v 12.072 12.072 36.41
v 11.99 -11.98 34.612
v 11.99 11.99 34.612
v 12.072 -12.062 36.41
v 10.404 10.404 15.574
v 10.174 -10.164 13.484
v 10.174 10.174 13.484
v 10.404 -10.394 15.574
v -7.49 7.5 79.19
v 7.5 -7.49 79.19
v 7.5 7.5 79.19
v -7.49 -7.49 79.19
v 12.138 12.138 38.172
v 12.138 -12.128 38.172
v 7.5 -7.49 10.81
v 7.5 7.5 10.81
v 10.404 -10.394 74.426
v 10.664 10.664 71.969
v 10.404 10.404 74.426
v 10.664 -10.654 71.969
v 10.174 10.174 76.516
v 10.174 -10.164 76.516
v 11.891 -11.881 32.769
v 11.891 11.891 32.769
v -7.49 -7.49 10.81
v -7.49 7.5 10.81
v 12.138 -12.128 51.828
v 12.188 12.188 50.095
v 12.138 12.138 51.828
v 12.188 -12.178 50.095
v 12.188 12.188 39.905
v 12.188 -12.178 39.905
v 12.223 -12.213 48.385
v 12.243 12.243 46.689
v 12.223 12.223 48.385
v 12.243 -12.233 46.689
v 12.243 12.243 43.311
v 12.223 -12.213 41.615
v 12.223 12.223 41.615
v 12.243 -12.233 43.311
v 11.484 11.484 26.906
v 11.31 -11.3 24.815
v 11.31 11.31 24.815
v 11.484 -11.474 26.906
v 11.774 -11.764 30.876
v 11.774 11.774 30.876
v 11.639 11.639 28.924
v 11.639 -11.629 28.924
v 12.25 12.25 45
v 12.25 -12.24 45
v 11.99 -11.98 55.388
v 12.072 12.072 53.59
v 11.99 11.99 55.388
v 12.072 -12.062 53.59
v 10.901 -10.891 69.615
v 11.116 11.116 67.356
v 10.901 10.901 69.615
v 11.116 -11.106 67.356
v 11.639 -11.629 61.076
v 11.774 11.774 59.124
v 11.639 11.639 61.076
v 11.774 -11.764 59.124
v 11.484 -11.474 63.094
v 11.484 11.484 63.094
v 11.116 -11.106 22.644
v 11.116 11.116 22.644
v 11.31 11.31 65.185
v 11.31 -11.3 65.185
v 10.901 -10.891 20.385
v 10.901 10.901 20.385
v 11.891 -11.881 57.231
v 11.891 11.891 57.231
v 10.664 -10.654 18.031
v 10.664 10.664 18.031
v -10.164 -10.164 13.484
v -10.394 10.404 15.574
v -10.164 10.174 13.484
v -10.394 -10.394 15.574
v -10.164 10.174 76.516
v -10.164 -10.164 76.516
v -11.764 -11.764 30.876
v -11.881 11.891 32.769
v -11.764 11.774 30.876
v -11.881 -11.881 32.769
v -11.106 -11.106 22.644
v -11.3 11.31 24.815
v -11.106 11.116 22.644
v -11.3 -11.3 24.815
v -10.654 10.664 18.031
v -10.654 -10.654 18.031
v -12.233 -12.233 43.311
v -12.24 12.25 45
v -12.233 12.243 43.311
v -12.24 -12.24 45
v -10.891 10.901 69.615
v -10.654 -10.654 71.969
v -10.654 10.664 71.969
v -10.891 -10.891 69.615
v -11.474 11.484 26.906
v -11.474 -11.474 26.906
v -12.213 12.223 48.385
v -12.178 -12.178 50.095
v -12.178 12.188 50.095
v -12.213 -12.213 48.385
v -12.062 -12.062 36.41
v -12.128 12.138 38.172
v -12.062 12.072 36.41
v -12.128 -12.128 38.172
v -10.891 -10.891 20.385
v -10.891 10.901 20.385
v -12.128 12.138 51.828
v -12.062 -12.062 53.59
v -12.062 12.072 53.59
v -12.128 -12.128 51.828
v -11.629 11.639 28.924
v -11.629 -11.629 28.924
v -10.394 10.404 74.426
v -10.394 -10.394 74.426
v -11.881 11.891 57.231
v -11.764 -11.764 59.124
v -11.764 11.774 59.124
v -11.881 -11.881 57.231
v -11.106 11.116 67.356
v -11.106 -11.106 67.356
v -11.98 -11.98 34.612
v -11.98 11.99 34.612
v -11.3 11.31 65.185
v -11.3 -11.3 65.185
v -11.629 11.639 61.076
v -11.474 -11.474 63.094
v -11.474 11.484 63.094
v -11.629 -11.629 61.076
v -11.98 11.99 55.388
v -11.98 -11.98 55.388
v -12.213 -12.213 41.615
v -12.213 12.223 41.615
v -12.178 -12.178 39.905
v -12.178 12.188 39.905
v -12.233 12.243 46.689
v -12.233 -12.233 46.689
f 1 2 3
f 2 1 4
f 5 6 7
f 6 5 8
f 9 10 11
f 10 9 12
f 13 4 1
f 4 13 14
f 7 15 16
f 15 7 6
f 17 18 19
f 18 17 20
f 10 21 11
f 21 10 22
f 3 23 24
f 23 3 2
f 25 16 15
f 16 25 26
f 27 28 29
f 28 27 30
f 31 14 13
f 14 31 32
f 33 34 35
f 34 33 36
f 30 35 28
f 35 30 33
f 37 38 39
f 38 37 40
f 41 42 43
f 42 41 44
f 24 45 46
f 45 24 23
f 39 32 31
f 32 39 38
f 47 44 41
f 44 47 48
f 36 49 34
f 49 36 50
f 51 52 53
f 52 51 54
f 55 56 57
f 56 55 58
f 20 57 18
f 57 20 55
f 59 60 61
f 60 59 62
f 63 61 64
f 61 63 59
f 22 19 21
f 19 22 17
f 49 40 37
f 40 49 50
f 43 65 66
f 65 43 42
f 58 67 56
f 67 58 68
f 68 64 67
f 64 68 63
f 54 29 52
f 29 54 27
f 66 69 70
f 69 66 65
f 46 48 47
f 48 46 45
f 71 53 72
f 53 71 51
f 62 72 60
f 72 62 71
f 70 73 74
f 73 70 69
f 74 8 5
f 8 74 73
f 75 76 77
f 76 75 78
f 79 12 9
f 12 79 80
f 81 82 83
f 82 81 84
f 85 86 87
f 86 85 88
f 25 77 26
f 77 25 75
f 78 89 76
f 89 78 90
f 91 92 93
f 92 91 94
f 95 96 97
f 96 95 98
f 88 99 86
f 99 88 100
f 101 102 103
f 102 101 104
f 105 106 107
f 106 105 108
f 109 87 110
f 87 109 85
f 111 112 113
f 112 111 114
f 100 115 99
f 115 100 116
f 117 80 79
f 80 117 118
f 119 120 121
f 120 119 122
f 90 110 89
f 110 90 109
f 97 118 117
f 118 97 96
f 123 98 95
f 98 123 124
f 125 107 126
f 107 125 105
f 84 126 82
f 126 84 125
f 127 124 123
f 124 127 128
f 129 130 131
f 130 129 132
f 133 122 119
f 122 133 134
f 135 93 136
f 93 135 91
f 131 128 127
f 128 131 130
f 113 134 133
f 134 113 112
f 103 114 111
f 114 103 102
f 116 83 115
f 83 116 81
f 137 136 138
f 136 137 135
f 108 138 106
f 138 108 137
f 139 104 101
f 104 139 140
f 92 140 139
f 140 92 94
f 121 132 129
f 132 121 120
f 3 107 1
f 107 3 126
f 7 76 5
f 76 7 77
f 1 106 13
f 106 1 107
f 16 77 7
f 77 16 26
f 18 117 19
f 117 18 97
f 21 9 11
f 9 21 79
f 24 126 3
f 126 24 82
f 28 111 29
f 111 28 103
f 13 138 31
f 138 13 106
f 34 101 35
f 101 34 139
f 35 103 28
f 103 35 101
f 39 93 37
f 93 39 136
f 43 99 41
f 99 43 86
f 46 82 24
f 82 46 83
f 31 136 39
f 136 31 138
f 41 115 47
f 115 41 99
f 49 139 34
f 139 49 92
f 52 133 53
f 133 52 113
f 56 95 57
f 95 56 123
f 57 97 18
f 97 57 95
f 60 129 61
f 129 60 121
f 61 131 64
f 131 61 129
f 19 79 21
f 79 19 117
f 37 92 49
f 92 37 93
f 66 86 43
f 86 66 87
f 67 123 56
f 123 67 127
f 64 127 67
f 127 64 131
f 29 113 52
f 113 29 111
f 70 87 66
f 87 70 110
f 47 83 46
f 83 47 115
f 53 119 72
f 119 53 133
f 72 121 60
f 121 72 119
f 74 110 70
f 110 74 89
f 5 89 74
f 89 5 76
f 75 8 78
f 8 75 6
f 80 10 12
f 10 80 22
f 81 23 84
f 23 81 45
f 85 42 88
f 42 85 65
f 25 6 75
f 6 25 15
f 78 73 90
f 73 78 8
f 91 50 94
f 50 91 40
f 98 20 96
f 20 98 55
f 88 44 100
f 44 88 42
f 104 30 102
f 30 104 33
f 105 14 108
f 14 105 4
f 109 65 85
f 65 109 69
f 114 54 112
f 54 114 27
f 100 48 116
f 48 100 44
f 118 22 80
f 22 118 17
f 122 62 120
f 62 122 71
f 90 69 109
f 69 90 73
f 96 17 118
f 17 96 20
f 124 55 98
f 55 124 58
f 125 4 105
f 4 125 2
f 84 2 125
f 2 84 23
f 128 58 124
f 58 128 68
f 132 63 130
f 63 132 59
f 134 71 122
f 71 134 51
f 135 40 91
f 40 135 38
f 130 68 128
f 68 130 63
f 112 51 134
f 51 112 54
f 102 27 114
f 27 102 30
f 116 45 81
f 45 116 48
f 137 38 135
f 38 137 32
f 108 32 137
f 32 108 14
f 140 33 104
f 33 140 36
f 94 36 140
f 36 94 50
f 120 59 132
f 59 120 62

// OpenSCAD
// file: bezier.scad
/* 
Copyright (c) 2017 Alexander R. Pruss.

Licensed under any Creative Commons Attribution license you like or under the 
following MIT License.

Permission is hereby granted, free of charge, to any person obtaining a copy
of this software and associated documentation files (the "Software"), to deal
in the Software without restriction, including without limitation the rights
to use, copy, modify, merge, publish, distribute, sublicense, and/or sell
copies of the Software, and to permit persons to whom the Software is
furnished to do so, subject to the following conditions:

The above copyright notice and this permission notice shall be included in all
copies or substantial portions of the Software.

THE SOFTWARE IS PROVIDED "AS IS", WITHOUT WARRANTY OF ANY KIND, EXPRESS OR
IMPLIED, INCLUDING BUT NOT LIMITED TO THE WARRANTIES OF MERCHANTABILITY,
FITNESS FOR A PARTICULAR PURPOSE AND NONINFRINGEMENT. IN NO EVENT SHALL THE
AUTHORS OR COPYRIGHT HOLDERS BE LIABLE FOR ANY CLAIM, DAMAGES OR OTHER
LIABILITY, WHETHER IN AN ACTION OF CONTRACT, TORT OR OTHERWISE, ARISING FROM,
OUT OF OR IN CONNECTION WITH THE SOFTWARE OR THE USE OR OTHER DEALINGS IN THE
SOFTWARE. 

*/


// Public domain Bezier stuff from www.thingiverse.com/thing:8443
function BEZ03(u) = pow((1-u), 3);
function BEZ13(u) = 3*u*(pow((1-u),2));
function BEZ23(u) = 3*(pow(u,2))*(1-u);
function BEZ33(u) = pow(u,3);
function PointAlongBez4(p0, p1, p2, p3, u) = [
	BEZ03(u)*p0[0]+BEZ13(u)*p1[0]+BEZ23(u)*p2[0]+BEZ33(u)*p3[0],
	BEZ03(u)*p0[1]+BEZ13(u)*p1[1]+BEZ23(u)*p2[1]+BEZ33(u)*p3[1]];
// End public domain Bezier stuff

function SMOOTH_REL(x) = ["r",x];
function SMOOTH_ABS(x) = ["a",x];
function SYMMETRIC() = ["r",1];
function OFFSET(v) = ["o",v];
function SHARP() = OFFSET([0,0]);
function POLAR(r,angle) = OFFSET(r*[cos(angle),sin(angle)]);
function POINT_IS_SPECIAL(v) = (v[0]=="r" || v[0]=="a" || v[0]=="o");

function normalize2D(v) = v / sqrt(v[0]*v[0]+v[1]*v[1]);

// this does NOT handle offset type points; to handle those, use DecodeBezierOffsets()
function getControlPoint(cp,node,otherCP) = cp[0]=="r"?(node+cp[1]*(node-otherCP)):( cp[0]=="a"?node+cp[1]*normalize2D(node-otherCP):cp );

function Bezier2(p,index=0,precision=0.05,rightEndPoint=true) = let(nPoints=ceil(1/precision)) [for (i=[0:nPoints-(rightEndPoint?0:1)]) PointAlongBez4(p[index+0],p[index+1],p[index+2],p[index+3],i/nPoints)];
    
function flatten(listOfLists) = [ for(list = listOfLists) for(item = list) item ];


// p is a list of points, in the format:
// [node1,control1,control2,node2,control3, control4,node3, ...]
// You can replace inner control points with:
//   SYMMETRIC: uses a reflection of the control point on the other side of the node
//   SMOOTH_REL(x): like SYMMETRIC, but the distance of the control point to the node is x times the distance of the other control point to the node
//   SMOOTH_ABS(x): like SYMMETRIC, but the distance of the control point to the node is exactly x
// You can also replace any control point with:
//   OFFSET(v): puts the control point at the corresponding node plus the vector v
//   SHARP(): equivalent to OFFSET([0,0]); useful for straight lines
//   POLAR(r,angle): like OFFSET, except the offset is specified in polar coordinates

function DecodeBezierOffset(control,node) = control[0] == "o" ? node+control[1] : control;

// replace all OFFSET/SHARP/POLAR points with coordinates
function DecodeBezierOffsets(p) = [for (i=[0:len(p)-1]) i%3==0?p[i]:(i%3==1?DecodeBezierOffset(p[i],p[i-1]):DecodeBezierOffset(p[i],p[i+1]))];

function DecodeSpecialBezierPoints(p0) = let(p=DecodeBezierOffsets(p0)) [for (i=[0:len(p)-1]) i%3==0?p[i]:(i%3==1?getControlPoint(p[i],p[i-1],p[i-2]):getControlPoint(p[i],p[i+1],p[i+2]))];

function Distance2D(a,b) = sqrt((a[0]-b[0])*(a[0]-b[0])+(a[1]-b[1])*(a[1]-b[1]));

function RemoveDuplicates(p,eps=0.00001) = let(safeEps = eps/len(p)) [for (i=[0:len(p)-1]) if(i==0 || i==len(p)-1 || Distance2D(p[i-1],p[i]) >= safeEps) p[i]];

function Bezier(p,precision=0.05,eps=0.00001) = let(q=DecodeSpecialBezierPoints(p), nodes=(len(p)-1)/3) RemoveDuplicates(flatten([for (i=[0:nodes-1]) Bezier2(q,index=i*3,precision=precision,rightEndPoint=(i==nodes-1))]),eps=eps);

//<skip>
linear_extrude(height=5) {
polygon(Bezier([[0,0],/*C*/[5,0],/*C*/SYMMETRIC(),[10,10],/*C*/[15,10],/*C*/OFFSET([-5,0]),[20,0]],precision=0.05));
translate([0,15])
polygon(Bezier([[0,0],/*C*/[5,0],/*C*/SMOOTH_REL(2),[10,10],/*C*/[15,10],/*C*/POLAR(5,180),[20,0]],precision=0.05));
translate([0,30])
polygon(Bezier([[0,0],/*C*/[5,0],/*C*/SMOOTH_ABS(1.5),[10,10],/*C*/[15,10],/*C*/OFFSET([-5,0]),[20,0]],precision=0.05));
translate([0,45])
polygon(Bezier([[0,0],/*C*/[5,0],/*C*/SMOOTH_REL(-1),[10,10],/*C*/[15,10],/*C*/OFFSET([-5,0]),[20,0]],precision=0.05));
translate([0,60])
polygon(Bezier([[0,0],/*C*/[5,0],/*C*/SMOOTH_ABS(-1),[10,10],/*C*/[15,10],/*C*/OFFSET([-5,0]),[20,0]],precision=0.05));
translate([0,75])
polygon(Bezier([[0,0],/*C*/SHARP(),/*C*/SHARP(),[10,10],/*C*/SHARP(),/*C*/OFFSET([-5,0]),[20,0]],precision=0.05));
}
//</skip>
// main file
use <bezier.scad>;

//<params>
tipDiameter = 20;
centerDiameter = 27;
height = 90;
chamferSize = 1.5;
// fraction of total height occupied by each solid end cap 
endCapFraction = 0.12; 
wallThickness = 1.25;
maxBridgeLength = 15;
squareCrossSection = true;

// height for weight capsule (if used, stop printing here and insert weights)
weightCapsuleHeight = 0; 
weightCapsuleDiameter = 15;
weightCapsuleNumberOfSides = 4;
weightCapsuleOffsetFromTip = 3;

module dummy() {}
//</params>

nudge = 0.01;
endCapSize = max(endCapFraction*height, weightCapsuleHeight > 0 ? weightCapsuleHeight+weightCapsuleOffsetFromTip+2 : 0);

module pinCrossSection(tipDiameter=tipDiameter, centerDiameter=centerDiameter, height=height) {
    tipR = tipDiameter / 2;
    centerR = centerDiameter / 2;

    bezierPointsTop = [
      [0,height],/*C*/OFFSET([1,0]),OFFSET([-1,0]), 
      /*N*/[tipR-chamferSize,height],
      /*C*/SMOOTH_ABS(chamferSize*0.5), 
      /*C*/SMOOTH_ABS(chamferSize*0.5), 
      /*N*/[tipR,height-chamferSize], 
      [tipR*0.25+centerR*0.75,0.75*height], [centerR,0.625*height], [centerR,0.5*height]];
    function flip(v) = [v[0],height-v[1]];
    fixedTop = DecodeSpecialBezierPoints(bezierPointsTop);
    bezierPointsBottom = [ for(i=[1:len(fixedTop)-1]) let(j=len(fixedTop)-1-i) flip(fixedTop[j]) ];
    bezierPoints = concat(bezierPointsTop,bezierPointsBottom);
    polygon(Bezier(bezierPoints));
}

module pin(tipDiameter=tipDiameter, centerDiameter=centerDiameter, height=height, $fn=$fn) {
    rotate_extrude() crossSection(tipDiameter=tipDiameter, centerDiameter=centerDiameter, height=height);
}

module insidePinCrossSection() {
    $fn = 16;
    
    maxDiameter = max(tipDiameter,centerDiameter);

    cylinderHeight = maxBridgeLength < maxDiameter ? 0.5*(maxDiameter-maxBridgeLength) : 0;
    
    module antiBridgingCylinder() {
        if (maxBridgeLength < maxDiameter) {
            translate([0,-cylinderHeight])
            polygon([[0,0],[maxDiameter/2,0],[maxBridgeLength/2,cylinderHeight],[0,cylinderHeight]]);
        }
    }
    
        intersection() {
            pinCrossSection(tipDiameter=tipDiameter-2*wallThickness, centerDiameter=centerDiameter-2*wallThickness);
            union() {
                translate([-maxDiameter/2,endCapSize+cylinderHeight]) square([maxDiameter,height-2*endCapSize-2*cylinderHeight]);
                translate([0,height-endCapSize-nudge])
                    antiBridgingCylinder();
                translate([0,endCapSize+nudge])
                mirror([0,1]) antiBridgingCylinder();
            }
        }
}

module crossSection() {
    $fn = 60;
    difference() {
        pinCrossSection();
        insidePinCrossSection();
    }
}

module oneSideSlab(slabWidth=slabWidth) {
    linear_extrude(height=wallThickness) pinCrossSection();
    linear_extrude(height = slabWidth)
        crossSection();
    translate([0,0,slabWidth-wallThickness])
    linear_extrude(height=wallThickness) pinCrossSection();
}

module withSquareCrossSection() {
    intersection() {
        translate([0,centerDiameter/2,0]) 
        rotate([90,0,0]) {
                linear_extrude(height=centerDiameter) children();
                translate([nudge,0,0]) mirror([1,0,0]) linear_extrude(height=centerDiameter) children();
        }
        rotate([0,0,90])
        translate([0,centerDiameter/2,0]) 
        rotate([90,0,0]) {
                linear_extrude(height=centerDiameter) children();
                translate([nudge,0,0]) mirror([1,0,0]) linear_extrude(height=centerDiameter) children();
        }
    }
}

render(convexity=1)
union() {
    if (squareCrossSection) {
        difference() {
            %withSquareCrossSection() pinCrossSection();
            withSquareCrossSection() insidePinCrossSection();
        }
    }
    else {
        rotate_extrude($fn=60) crossSection();
    }
    if (weightCapsuleHeight>0) {
        rotate([0,0,180/weightCapsuleNumberOfSides]) {
            translate([0,0,weightCapsuleOffsetFromTip])
                cylinder(h=weightCapsuleHeight,d=weightCapsuleDiameter,$fn=weightCapsuleNumberOfSides);
            translate([0,0,height-weightCapsuleOffsetFromTip-weightCapsuleHeight])
                cylinder(h=weightCapsuleHeight,d=weightCapsuleDiameter,$fn=weightCapsuleNumberOfSides);
        }
    }
}
